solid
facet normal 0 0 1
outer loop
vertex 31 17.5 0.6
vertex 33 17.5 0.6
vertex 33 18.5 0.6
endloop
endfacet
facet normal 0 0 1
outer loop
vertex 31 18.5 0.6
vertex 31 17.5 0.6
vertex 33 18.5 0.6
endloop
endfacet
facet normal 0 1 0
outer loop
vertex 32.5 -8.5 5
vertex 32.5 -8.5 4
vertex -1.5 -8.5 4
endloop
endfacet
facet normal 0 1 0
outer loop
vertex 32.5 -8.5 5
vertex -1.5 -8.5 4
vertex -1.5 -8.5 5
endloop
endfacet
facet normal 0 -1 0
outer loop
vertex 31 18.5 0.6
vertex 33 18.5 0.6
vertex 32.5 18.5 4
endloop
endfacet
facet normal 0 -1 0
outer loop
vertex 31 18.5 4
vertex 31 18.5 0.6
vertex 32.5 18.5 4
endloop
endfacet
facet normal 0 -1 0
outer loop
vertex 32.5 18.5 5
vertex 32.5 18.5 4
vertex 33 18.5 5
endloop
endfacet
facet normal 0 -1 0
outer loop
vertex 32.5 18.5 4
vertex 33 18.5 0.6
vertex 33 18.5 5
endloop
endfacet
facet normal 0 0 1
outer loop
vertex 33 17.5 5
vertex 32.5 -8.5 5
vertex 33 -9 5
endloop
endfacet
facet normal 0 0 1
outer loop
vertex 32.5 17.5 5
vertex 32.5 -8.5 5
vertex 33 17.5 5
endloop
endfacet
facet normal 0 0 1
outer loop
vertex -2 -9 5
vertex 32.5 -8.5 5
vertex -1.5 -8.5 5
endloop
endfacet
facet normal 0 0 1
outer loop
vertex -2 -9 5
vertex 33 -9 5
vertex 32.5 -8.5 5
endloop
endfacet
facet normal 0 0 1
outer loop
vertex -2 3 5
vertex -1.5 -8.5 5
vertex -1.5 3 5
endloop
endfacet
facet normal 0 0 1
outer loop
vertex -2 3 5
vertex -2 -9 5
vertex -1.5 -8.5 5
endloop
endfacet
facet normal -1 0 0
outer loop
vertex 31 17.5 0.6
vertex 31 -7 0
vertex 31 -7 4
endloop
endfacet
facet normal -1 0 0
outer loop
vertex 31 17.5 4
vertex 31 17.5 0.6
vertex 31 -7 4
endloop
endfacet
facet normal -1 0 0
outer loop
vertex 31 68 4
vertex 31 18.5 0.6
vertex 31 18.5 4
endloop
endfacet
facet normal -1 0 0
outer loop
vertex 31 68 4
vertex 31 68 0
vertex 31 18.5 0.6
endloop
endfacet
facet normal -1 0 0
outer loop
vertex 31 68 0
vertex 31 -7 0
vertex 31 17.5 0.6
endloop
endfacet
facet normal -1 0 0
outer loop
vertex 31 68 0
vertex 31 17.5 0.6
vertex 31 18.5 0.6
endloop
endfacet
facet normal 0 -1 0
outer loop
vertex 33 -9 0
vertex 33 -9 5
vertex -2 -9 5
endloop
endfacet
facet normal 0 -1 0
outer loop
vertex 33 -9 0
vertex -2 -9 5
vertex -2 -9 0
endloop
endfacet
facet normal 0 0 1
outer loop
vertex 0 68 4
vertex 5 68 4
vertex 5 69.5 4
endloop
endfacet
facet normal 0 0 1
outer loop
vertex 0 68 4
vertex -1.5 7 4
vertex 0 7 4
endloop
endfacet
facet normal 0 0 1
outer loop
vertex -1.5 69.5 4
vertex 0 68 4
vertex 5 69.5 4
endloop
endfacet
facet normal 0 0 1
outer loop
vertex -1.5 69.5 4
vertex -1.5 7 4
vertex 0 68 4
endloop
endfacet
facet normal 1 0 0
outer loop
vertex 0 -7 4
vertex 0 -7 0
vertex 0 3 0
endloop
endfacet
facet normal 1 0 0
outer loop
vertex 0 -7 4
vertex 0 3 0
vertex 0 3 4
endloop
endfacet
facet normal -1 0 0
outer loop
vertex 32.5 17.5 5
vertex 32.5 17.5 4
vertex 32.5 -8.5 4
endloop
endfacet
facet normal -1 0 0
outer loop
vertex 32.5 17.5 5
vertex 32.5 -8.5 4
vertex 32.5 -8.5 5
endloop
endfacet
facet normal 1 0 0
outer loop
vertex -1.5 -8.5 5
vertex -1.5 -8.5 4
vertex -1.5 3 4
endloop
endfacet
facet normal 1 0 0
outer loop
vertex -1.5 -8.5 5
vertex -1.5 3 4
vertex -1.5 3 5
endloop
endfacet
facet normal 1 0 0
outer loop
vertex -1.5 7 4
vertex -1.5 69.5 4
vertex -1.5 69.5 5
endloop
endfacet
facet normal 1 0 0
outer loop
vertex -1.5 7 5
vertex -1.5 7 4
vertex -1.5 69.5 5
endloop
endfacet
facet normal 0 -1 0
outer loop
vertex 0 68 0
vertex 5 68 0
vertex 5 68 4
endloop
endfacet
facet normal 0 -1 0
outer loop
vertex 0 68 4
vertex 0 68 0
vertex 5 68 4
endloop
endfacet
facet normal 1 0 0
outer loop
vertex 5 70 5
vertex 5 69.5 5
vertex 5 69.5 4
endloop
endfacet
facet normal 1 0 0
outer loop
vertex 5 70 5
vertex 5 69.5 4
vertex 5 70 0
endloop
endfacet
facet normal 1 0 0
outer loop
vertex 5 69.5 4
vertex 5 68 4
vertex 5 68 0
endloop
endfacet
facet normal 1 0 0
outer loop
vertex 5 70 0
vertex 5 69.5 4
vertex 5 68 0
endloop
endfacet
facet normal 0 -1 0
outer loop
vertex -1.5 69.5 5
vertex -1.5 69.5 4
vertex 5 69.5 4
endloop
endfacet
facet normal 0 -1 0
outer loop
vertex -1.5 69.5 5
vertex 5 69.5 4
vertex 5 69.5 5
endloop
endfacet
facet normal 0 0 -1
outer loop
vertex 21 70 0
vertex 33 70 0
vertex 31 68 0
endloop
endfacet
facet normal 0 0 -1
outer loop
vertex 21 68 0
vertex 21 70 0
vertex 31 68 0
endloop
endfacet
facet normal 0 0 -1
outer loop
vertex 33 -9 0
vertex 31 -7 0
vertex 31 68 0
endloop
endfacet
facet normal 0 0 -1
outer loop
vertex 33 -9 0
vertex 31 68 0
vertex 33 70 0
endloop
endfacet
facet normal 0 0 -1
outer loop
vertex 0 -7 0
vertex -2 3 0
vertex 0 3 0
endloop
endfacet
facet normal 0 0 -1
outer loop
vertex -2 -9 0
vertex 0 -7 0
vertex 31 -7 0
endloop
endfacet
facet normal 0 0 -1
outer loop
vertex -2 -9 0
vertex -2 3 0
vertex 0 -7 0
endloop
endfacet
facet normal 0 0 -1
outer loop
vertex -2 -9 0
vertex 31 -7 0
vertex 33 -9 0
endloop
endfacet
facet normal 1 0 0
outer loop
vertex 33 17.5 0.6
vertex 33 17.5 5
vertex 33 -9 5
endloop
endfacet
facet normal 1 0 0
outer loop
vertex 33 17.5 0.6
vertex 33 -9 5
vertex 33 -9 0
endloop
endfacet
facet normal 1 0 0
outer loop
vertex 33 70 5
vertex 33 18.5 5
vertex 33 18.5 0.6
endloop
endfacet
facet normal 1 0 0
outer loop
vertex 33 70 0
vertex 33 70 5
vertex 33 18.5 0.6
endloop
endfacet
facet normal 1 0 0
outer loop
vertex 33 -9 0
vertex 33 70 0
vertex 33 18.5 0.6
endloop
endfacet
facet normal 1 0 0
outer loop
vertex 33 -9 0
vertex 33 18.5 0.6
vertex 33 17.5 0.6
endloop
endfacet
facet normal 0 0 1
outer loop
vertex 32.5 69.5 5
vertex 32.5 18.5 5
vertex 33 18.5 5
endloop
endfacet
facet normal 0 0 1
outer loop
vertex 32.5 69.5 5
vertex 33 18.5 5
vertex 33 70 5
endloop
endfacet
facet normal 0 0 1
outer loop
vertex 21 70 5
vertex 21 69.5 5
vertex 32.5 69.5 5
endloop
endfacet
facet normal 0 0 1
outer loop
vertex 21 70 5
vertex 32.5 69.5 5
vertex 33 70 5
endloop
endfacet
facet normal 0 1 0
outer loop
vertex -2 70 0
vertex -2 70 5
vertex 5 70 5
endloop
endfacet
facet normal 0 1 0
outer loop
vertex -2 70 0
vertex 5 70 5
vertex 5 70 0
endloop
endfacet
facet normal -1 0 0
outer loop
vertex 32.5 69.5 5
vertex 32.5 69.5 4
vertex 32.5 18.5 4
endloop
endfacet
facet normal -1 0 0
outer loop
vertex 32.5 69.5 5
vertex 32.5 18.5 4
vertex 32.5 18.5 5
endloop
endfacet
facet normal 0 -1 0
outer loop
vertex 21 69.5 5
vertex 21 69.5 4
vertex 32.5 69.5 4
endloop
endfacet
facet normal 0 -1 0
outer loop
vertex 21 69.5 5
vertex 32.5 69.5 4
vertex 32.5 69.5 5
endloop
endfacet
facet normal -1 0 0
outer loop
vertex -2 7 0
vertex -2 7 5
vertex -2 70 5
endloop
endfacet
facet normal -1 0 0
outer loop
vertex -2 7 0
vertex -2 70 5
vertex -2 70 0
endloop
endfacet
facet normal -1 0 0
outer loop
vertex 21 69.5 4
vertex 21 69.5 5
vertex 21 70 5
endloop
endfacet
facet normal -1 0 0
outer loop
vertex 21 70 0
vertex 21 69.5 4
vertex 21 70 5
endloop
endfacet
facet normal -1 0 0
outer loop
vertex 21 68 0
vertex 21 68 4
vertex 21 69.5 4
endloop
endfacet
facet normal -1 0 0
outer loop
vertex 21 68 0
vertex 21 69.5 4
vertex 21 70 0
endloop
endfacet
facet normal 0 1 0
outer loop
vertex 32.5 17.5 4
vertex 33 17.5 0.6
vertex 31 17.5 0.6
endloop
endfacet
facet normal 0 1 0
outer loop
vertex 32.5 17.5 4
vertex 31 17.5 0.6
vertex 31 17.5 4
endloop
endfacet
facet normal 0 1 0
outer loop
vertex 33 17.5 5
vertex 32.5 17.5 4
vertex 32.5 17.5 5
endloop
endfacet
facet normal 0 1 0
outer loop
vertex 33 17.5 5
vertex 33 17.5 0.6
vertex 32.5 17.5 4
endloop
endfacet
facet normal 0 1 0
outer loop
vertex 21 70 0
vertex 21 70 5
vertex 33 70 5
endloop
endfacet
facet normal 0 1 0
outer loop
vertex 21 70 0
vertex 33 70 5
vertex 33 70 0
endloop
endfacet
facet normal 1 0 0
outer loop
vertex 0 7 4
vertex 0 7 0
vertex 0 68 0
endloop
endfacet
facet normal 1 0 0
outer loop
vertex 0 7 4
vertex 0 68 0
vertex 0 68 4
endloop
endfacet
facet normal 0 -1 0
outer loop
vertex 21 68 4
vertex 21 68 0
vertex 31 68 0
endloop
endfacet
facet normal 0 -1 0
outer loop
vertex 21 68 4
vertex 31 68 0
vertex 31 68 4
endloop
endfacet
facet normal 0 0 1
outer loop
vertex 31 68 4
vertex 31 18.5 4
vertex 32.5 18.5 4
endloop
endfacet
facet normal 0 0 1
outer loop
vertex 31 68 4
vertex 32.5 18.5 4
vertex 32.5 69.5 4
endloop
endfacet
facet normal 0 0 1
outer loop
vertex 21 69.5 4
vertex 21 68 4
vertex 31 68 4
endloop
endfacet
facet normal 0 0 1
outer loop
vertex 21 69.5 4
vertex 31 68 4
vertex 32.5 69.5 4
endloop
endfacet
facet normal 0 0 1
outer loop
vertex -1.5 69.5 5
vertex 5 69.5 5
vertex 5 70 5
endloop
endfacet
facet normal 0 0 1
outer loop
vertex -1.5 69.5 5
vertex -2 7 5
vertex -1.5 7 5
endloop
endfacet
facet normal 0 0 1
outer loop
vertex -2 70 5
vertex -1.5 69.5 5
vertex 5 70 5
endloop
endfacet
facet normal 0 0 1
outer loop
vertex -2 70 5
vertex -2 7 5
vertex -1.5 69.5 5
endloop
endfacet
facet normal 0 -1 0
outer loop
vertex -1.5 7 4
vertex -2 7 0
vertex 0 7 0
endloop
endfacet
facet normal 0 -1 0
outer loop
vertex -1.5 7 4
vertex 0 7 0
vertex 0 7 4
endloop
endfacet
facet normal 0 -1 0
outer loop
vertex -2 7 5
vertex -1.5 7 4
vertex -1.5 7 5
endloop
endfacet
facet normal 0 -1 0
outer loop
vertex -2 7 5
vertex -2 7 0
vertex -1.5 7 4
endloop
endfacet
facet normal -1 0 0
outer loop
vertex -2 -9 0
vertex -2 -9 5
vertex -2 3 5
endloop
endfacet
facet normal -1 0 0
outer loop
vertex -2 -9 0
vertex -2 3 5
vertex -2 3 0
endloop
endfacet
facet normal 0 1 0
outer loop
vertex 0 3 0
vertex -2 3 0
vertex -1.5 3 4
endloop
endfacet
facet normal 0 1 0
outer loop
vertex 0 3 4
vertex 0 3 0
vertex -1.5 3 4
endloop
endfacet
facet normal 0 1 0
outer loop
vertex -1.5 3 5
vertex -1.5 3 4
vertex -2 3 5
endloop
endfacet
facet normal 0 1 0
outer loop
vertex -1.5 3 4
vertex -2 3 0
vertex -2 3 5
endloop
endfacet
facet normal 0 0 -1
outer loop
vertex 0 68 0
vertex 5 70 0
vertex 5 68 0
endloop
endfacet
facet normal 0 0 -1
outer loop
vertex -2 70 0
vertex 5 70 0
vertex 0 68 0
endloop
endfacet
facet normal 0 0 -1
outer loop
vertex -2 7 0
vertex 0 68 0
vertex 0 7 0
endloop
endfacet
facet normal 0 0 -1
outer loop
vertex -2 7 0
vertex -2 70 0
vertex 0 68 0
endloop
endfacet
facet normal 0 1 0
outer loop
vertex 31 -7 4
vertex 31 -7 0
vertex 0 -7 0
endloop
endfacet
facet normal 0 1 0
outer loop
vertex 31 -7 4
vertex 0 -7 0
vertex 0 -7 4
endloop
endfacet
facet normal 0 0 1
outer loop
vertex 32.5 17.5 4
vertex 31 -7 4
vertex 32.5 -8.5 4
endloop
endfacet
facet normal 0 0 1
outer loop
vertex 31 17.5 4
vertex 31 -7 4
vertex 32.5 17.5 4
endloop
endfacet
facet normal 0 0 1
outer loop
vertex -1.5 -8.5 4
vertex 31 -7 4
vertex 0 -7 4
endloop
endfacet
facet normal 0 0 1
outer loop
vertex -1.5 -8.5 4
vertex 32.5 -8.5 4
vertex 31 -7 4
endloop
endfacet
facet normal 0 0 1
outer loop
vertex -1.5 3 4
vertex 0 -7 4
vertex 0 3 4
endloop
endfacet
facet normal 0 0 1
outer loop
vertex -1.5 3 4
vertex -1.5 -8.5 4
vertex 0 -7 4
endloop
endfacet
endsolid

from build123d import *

# Parameters (mm, degrees)
SKETCH010_W           = 4
SKETCH010_H           = 5
EXTRUDE008_DEPTH      = 4
SKETCH009_W           = 1
SKETCH009_H           = 6
EXTRUDE007_DEPTH      = 1
EXTRUDE007_DEPTH_BACK = 3


with BuildPart() as led004:
    # Sketch010 → Extrude008 (new body)
    with BuildSketch(Plane(origin=(-3, 0, 0), x_dir=(0, -1, 0), z_dir=(-1, 0, 0))):
        with Locations((-5, 2.5)):
            Rectangle(SKETCH010_W, SKETCH010_H)
    extrude(amount=-EXTRUDE008_DEPTH)


with BuildPart() as compound:
    # Sketch009 → Extrude007 (new body, two sides)
    with BuildSketch(Plane.YZ.offset(33)) as extrude007_sk:
        with Locations((18, 3.6)):
            Rectangle(SKETCH009_W, SKETCH009_H)
    extrude(amount=EXTRUDE007_DEPTH)
    extrude(extrude007_sk.sketch, amount=-EXTRUDE007_DEPTH_BACK)

    # Compound: union led004
    add(led004.part)


with BuildPart() as cut:
    # Sweep: sweep along a path in Sketch003
    with BuildLine(Plane.XY) as sweep_path:
        Line((5, 68), (0, 68))
        Line((0, 68), (0, -7))
        Line((0, -7), (31, -7))
        Line((31, -7), (31, 68))
        Line((31, 68), (21, 68))
    # Sketch002 → Sweep (sweep)
    with BuildSketch(Plane.YZ.offset(16)):
        Polygon((-7, 0), (-7, 4), (-8.5, 4), (-8.5, 5), (-9, 5), (-9, 0), align=None)
    sweep(path=sweep_path.line, transition=Transition.RIGHT)

    # Cut: cut Compound
    add(compound.part, mode=Mode.SUBTRACT)


solid = cut.part
